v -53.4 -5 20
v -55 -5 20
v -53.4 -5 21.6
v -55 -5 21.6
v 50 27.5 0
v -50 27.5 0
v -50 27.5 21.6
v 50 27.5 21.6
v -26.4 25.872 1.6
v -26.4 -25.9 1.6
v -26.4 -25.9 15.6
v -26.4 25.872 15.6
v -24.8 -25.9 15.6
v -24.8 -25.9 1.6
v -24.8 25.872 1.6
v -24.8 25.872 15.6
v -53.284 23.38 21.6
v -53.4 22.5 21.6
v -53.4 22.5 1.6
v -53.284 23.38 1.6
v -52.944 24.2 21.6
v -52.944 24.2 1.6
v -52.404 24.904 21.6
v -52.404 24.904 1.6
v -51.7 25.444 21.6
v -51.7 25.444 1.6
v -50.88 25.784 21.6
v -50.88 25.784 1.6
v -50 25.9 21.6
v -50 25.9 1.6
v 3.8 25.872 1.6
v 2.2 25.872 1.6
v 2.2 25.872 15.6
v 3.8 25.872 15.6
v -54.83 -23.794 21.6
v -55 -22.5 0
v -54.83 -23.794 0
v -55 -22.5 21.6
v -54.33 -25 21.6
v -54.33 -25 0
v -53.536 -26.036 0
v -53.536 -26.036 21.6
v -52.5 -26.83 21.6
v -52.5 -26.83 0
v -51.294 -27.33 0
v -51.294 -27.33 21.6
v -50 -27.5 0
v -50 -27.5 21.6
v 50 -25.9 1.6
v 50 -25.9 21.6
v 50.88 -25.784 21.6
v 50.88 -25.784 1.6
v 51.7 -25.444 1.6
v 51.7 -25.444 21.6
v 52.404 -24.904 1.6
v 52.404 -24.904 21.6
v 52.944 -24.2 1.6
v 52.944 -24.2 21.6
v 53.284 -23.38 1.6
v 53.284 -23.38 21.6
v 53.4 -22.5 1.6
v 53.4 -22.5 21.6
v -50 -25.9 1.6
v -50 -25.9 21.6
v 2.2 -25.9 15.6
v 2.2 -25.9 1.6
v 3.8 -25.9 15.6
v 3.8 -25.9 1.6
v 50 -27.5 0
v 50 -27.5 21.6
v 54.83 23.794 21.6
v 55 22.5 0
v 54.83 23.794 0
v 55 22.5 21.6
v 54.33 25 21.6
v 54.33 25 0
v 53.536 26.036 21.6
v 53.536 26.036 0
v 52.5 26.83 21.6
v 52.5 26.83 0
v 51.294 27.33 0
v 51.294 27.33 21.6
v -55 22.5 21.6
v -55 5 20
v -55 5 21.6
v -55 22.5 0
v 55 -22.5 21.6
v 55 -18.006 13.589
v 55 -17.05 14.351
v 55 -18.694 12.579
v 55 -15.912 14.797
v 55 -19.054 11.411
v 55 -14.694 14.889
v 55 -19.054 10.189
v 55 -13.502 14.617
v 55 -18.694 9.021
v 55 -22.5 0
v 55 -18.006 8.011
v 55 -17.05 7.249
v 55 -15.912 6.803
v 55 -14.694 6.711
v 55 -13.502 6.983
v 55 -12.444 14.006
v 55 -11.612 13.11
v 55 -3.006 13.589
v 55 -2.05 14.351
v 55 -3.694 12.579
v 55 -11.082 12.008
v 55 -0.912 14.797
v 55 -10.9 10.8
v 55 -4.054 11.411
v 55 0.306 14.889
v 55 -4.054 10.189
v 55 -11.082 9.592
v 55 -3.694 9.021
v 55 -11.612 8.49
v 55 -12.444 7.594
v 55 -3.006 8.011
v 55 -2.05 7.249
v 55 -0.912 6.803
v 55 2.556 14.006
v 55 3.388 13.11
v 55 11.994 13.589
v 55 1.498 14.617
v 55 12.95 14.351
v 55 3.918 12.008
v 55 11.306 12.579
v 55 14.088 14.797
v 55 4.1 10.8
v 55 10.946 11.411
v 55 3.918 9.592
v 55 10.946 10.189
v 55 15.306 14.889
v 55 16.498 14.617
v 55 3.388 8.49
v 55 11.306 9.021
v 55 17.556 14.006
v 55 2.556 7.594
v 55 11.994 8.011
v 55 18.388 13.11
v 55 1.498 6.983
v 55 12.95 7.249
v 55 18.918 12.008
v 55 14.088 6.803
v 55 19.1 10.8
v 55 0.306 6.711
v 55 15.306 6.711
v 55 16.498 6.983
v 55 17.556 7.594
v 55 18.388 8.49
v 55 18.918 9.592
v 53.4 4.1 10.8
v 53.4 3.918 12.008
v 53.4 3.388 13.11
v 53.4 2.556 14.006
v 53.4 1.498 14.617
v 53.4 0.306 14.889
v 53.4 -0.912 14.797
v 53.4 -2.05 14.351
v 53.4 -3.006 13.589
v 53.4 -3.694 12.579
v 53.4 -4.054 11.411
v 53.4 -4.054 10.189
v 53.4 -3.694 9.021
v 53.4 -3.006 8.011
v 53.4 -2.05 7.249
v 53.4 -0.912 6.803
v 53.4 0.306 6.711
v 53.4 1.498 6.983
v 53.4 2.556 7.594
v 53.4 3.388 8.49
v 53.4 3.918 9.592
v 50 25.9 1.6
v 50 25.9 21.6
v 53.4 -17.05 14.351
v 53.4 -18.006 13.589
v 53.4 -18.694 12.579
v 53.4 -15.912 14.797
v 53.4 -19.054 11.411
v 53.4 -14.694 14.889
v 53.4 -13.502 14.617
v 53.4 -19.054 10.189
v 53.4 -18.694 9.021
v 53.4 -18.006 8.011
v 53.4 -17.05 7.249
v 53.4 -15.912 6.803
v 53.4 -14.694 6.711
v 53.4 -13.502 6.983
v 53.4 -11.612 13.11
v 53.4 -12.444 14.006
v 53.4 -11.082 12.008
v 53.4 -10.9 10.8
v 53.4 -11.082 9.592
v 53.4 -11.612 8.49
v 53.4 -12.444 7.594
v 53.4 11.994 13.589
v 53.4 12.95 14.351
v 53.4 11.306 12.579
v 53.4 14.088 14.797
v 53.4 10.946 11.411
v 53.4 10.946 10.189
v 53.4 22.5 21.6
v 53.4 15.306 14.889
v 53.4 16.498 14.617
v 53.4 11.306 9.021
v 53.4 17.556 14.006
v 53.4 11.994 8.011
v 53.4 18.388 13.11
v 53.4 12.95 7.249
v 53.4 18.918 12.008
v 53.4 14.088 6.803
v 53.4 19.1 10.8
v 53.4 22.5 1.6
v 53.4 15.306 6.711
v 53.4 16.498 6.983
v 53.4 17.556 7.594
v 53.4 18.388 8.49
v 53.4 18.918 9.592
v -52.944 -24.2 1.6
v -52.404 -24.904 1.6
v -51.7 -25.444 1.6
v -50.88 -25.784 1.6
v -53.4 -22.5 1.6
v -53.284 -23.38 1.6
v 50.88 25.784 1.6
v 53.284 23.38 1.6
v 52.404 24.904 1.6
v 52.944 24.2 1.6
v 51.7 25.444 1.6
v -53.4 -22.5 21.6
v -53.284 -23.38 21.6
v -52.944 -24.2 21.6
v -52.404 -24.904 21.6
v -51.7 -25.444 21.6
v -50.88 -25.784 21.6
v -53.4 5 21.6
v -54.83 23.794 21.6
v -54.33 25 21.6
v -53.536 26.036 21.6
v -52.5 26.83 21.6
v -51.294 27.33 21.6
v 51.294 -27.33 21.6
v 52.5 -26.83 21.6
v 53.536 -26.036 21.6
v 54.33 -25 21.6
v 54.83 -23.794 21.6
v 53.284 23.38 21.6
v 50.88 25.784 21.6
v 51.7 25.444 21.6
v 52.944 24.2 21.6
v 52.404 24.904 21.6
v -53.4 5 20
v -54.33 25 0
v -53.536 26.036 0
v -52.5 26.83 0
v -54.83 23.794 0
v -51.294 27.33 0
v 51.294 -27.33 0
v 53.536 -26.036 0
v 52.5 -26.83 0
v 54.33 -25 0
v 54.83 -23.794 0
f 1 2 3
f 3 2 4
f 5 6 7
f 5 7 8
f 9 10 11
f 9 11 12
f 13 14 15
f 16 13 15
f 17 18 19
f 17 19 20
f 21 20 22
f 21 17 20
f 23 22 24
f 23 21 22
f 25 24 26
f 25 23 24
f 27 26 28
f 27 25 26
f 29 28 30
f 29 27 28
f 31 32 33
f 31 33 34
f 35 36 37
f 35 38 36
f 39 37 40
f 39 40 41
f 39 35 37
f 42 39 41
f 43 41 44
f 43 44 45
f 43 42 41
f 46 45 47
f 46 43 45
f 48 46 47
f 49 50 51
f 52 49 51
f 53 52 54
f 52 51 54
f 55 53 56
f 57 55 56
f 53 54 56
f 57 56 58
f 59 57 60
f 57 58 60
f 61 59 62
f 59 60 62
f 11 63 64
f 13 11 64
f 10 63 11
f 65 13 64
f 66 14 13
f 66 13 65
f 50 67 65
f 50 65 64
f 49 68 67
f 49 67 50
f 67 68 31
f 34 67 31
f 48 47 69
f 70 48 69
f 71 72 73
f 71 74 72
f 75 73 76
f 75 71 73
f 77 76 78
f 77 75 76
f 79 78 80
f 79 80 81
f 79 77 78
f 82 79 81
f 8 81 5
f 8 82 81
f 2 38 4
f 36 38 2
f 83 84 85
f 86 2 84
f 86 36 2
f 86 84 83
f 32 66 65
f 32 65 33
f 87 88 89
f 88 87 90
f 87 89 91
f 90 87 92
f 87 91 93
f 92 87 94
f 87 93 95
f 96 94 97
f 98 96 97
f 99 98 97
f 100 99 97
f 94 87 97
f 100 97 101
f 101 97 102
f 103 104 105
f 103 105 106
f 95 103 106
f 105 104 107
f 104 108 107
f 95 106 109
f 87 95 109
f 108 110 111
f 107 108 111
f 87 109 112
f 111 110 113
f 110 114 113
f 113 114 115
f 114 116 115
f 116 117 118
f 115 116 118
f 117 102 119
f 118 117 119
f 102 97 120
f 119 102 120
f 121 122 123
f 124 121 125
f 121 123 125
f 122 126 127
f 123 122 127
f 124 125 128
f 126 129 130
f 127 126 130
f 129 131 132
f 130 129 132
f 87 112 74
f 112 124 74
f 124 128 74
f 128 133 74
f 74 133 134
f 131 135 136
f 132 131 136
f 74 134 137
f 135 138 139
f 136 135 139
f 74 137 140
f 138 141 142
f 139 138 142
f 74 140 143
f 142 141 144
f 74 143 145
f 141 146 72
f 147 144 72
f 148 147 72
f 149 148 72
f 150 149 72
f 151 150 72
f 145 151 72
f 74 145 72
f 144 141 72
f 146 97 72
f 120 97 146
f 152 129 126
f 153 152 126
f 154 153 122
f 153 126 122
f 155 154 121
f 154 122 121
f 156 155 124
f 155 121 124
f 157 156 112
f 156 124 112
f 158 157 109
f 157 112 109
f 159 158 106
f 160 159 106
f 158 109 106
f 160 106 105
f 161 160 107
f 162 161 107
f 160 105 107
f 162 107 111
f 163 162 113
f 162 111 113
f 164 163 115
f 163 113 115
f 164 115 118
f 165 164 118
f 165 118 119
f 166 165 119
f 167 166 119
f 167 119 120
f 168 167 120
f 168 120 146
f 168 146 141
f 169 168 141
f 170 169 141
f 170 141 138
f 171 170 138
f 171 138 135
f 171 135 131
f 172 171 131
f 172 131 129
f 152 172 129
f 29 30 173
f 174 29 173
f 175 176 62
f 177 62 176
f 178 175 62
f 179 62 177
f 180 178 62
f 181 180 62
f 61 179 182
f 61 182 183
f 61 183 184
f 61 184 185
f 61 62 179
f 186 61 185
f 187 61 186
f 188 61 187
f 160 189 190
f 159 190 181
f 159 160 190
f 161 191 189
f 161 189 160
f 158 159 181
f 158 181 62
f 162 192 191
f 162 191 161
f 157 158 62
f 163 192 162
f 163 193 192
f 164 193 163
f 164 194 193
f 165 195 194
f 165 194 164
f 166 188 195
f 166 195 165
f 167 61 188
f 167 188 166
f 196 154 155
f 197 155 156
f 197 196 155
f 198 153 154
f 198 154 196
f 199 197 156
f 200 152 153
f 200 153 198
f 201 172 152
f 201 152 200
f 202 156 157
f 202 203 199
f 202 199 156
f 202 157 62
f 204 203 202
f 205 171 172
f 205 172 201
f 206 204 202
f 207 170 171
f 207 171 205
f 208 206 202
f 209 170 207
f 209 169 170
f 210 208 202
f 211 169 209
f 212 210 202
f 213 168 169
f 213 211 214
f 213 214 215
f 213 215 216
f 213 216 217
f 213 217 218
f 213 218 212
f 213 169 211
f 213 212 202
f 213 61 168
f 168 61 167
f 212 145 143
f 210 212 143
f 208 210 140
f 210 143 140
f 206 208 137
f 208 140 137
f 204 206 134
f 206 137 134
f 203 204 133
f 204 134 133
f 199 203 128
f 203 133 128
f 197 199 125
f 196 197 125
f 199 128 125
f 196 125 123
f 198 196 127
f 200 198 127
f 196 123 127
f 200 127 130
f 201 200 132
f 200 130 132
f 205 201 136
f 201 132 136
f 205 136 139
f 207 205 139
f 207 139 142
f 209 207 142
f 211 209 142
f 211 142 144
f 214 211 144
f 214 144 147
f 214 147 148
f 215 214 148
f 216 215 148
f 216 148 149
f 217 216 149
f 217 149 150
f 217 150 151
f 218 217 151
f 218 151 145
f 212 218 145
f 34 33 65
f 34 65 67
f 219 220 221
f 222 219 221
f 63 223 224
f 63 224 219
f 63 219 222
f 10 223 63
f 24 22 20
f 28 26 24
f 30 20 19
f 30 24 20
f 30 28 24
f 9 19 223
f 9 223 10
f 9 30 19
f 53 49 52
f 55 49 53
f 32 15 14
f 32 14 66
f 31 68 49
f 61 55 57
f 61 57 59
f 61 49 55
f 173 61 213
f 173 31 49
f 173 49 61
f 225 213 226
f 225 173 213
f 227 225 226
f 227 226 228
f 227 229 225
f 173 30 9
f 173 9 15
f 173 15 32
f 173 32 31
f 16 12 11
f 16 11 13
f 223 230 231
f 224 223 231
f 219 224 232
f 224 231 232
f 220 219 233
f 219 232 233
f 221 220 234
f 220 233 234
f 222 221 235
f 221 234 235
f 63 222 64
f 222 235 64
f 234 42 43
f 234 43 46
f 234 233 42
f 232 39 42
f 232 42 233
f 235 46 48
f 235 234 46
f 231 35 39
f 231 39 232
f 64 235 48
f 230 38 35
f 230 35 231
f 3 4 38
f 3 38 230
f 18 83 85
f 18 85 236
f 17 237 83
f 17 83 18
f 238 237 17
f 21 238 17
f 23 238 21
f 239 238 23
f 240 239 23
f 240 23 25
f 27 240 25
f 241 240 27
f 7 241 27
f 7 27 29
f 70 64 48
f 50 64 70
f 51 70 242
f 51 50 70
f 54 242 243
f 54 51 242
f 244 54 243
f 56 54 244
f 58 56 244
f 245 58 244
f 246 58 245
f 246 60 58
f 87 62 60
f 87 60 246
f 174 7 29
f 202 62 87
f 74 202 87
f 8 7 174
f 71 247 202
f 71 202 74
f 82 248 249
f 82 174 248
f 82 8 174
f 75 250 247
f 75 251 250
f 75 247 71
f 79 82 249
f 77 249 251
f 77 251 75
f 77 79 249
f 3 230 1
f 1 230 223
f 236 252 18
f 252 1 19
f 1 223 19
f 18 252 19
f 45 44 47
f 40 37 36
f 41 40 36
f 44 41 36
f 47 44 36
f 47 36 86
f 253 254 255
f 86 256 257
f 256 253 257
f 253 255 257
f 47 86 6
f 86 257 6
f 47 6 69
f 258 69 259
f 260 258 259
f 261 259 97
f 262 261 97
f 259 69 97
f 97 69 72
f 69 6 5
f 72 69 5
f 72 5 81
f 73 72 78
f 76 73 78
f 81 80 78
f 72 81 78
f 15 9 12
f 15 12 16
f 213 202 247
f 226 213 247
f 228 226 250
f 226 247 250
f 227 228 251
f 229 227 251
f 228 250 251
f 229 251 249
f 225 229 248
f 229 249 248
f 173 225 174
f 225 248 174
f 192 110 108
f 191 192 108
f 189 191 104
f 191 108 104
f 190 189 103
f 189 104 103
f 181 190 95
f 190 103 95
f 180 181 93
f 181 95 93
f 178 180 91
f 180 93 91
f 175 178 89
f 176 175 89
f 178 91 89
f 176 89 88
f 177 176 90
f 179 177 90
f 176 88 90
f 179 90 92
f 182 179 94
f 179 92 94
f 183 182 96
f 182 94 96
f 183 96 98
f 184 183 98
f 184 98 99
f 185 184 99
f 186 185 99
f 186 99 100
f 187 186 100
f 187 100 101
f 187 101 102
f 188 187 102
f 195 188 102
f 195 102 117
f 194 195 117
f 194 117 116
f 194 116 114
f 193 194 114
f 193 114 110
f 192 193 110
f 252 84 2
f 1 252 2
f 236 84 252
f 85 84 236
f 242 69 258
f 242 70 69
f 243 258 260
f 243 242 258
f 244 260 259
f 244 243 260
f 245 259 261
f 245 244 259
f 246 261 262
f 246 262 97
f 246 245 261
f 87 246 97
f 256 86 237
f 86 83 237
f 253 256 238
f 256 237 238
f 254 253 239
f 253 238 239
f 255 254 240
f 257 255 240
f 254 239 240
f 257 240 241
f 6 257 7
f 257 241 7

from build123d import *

# Parameters (mm, degrees)
F0_W      = 110
F0_H      = 55
F1_DEPTH  = 21.6
F2_R      = 5
F3_T      = -1.6
F5_W      = 1.6
F5_H      = 51.8
F6_DEPTH  = 14
F7_W      = 10
F7_H      = 1.6
F8_DEPTH  = 1.6
F9_R      = 4.1
F10_DEPTH = 3


with BuildPart() as f1:
    # F0 (on Top) → F1 (new body)
    with BuildSketch(Plane.XY):
        Rectangle(F0_W, F0_H)
    extrude(amount=F1_DEPTH)

    # F2
    f2_edges = [f1.edges().sort_by_distance(p)[0] for p in [
        (-55, -27.5, 10.8),
        (55, -27.5, 10.8),
        (55, 27.5, 10.8),
        (-55, 27.5, 10.8),
    ]]
    fillet(f2_edges, radius=F2_R)

    # F3
    f3_openings = [f1.faces().sort_by_distance(p)[0] for p in [
        (0, 0, 21.6),
    ]]
    offset(amount=F3_T, openings=f3_openings)

    # F5 (on face) → F6 (join)
    with BuildSketch(Plane.XY.offset(1.6)):
        with Locations((-25.6, -0.028194)):
            Rectangle(F5_W, F5_H)
        with Locations((3, -0.028194)):
            Rectangle(F5_W, F5_H)
    extrude(amount=F6_DEPTH)

    # F7 (on face) → F8 (cut, through all)
    with BuildSketch(Plane(origin=(-55, 0, 0), x_dir=(0, -1, 0), z_dir=(-1, 0, 0))):
        with Locations((0, 20.8)):
            Rectangle(F7_W, F7_H)
    extrude(amount=-F8_DEPTH, mode=Mode.SUBTRACT)

    # F9 (on face) → F10 (cut)
    with BuildSketch(Plane.YZ.offset(55)):
        with Locations((0, 10.8)):
            Circle(F9_R)
        with Locations((-15, 10.8)):
            Circle(F9_R)
        with Locations((15, 10.8)):
            Circle(F9_R)
    extrude(amount=-F10_DEPTH, mode=Mode.SUBTRACT)


solid = f1.part
